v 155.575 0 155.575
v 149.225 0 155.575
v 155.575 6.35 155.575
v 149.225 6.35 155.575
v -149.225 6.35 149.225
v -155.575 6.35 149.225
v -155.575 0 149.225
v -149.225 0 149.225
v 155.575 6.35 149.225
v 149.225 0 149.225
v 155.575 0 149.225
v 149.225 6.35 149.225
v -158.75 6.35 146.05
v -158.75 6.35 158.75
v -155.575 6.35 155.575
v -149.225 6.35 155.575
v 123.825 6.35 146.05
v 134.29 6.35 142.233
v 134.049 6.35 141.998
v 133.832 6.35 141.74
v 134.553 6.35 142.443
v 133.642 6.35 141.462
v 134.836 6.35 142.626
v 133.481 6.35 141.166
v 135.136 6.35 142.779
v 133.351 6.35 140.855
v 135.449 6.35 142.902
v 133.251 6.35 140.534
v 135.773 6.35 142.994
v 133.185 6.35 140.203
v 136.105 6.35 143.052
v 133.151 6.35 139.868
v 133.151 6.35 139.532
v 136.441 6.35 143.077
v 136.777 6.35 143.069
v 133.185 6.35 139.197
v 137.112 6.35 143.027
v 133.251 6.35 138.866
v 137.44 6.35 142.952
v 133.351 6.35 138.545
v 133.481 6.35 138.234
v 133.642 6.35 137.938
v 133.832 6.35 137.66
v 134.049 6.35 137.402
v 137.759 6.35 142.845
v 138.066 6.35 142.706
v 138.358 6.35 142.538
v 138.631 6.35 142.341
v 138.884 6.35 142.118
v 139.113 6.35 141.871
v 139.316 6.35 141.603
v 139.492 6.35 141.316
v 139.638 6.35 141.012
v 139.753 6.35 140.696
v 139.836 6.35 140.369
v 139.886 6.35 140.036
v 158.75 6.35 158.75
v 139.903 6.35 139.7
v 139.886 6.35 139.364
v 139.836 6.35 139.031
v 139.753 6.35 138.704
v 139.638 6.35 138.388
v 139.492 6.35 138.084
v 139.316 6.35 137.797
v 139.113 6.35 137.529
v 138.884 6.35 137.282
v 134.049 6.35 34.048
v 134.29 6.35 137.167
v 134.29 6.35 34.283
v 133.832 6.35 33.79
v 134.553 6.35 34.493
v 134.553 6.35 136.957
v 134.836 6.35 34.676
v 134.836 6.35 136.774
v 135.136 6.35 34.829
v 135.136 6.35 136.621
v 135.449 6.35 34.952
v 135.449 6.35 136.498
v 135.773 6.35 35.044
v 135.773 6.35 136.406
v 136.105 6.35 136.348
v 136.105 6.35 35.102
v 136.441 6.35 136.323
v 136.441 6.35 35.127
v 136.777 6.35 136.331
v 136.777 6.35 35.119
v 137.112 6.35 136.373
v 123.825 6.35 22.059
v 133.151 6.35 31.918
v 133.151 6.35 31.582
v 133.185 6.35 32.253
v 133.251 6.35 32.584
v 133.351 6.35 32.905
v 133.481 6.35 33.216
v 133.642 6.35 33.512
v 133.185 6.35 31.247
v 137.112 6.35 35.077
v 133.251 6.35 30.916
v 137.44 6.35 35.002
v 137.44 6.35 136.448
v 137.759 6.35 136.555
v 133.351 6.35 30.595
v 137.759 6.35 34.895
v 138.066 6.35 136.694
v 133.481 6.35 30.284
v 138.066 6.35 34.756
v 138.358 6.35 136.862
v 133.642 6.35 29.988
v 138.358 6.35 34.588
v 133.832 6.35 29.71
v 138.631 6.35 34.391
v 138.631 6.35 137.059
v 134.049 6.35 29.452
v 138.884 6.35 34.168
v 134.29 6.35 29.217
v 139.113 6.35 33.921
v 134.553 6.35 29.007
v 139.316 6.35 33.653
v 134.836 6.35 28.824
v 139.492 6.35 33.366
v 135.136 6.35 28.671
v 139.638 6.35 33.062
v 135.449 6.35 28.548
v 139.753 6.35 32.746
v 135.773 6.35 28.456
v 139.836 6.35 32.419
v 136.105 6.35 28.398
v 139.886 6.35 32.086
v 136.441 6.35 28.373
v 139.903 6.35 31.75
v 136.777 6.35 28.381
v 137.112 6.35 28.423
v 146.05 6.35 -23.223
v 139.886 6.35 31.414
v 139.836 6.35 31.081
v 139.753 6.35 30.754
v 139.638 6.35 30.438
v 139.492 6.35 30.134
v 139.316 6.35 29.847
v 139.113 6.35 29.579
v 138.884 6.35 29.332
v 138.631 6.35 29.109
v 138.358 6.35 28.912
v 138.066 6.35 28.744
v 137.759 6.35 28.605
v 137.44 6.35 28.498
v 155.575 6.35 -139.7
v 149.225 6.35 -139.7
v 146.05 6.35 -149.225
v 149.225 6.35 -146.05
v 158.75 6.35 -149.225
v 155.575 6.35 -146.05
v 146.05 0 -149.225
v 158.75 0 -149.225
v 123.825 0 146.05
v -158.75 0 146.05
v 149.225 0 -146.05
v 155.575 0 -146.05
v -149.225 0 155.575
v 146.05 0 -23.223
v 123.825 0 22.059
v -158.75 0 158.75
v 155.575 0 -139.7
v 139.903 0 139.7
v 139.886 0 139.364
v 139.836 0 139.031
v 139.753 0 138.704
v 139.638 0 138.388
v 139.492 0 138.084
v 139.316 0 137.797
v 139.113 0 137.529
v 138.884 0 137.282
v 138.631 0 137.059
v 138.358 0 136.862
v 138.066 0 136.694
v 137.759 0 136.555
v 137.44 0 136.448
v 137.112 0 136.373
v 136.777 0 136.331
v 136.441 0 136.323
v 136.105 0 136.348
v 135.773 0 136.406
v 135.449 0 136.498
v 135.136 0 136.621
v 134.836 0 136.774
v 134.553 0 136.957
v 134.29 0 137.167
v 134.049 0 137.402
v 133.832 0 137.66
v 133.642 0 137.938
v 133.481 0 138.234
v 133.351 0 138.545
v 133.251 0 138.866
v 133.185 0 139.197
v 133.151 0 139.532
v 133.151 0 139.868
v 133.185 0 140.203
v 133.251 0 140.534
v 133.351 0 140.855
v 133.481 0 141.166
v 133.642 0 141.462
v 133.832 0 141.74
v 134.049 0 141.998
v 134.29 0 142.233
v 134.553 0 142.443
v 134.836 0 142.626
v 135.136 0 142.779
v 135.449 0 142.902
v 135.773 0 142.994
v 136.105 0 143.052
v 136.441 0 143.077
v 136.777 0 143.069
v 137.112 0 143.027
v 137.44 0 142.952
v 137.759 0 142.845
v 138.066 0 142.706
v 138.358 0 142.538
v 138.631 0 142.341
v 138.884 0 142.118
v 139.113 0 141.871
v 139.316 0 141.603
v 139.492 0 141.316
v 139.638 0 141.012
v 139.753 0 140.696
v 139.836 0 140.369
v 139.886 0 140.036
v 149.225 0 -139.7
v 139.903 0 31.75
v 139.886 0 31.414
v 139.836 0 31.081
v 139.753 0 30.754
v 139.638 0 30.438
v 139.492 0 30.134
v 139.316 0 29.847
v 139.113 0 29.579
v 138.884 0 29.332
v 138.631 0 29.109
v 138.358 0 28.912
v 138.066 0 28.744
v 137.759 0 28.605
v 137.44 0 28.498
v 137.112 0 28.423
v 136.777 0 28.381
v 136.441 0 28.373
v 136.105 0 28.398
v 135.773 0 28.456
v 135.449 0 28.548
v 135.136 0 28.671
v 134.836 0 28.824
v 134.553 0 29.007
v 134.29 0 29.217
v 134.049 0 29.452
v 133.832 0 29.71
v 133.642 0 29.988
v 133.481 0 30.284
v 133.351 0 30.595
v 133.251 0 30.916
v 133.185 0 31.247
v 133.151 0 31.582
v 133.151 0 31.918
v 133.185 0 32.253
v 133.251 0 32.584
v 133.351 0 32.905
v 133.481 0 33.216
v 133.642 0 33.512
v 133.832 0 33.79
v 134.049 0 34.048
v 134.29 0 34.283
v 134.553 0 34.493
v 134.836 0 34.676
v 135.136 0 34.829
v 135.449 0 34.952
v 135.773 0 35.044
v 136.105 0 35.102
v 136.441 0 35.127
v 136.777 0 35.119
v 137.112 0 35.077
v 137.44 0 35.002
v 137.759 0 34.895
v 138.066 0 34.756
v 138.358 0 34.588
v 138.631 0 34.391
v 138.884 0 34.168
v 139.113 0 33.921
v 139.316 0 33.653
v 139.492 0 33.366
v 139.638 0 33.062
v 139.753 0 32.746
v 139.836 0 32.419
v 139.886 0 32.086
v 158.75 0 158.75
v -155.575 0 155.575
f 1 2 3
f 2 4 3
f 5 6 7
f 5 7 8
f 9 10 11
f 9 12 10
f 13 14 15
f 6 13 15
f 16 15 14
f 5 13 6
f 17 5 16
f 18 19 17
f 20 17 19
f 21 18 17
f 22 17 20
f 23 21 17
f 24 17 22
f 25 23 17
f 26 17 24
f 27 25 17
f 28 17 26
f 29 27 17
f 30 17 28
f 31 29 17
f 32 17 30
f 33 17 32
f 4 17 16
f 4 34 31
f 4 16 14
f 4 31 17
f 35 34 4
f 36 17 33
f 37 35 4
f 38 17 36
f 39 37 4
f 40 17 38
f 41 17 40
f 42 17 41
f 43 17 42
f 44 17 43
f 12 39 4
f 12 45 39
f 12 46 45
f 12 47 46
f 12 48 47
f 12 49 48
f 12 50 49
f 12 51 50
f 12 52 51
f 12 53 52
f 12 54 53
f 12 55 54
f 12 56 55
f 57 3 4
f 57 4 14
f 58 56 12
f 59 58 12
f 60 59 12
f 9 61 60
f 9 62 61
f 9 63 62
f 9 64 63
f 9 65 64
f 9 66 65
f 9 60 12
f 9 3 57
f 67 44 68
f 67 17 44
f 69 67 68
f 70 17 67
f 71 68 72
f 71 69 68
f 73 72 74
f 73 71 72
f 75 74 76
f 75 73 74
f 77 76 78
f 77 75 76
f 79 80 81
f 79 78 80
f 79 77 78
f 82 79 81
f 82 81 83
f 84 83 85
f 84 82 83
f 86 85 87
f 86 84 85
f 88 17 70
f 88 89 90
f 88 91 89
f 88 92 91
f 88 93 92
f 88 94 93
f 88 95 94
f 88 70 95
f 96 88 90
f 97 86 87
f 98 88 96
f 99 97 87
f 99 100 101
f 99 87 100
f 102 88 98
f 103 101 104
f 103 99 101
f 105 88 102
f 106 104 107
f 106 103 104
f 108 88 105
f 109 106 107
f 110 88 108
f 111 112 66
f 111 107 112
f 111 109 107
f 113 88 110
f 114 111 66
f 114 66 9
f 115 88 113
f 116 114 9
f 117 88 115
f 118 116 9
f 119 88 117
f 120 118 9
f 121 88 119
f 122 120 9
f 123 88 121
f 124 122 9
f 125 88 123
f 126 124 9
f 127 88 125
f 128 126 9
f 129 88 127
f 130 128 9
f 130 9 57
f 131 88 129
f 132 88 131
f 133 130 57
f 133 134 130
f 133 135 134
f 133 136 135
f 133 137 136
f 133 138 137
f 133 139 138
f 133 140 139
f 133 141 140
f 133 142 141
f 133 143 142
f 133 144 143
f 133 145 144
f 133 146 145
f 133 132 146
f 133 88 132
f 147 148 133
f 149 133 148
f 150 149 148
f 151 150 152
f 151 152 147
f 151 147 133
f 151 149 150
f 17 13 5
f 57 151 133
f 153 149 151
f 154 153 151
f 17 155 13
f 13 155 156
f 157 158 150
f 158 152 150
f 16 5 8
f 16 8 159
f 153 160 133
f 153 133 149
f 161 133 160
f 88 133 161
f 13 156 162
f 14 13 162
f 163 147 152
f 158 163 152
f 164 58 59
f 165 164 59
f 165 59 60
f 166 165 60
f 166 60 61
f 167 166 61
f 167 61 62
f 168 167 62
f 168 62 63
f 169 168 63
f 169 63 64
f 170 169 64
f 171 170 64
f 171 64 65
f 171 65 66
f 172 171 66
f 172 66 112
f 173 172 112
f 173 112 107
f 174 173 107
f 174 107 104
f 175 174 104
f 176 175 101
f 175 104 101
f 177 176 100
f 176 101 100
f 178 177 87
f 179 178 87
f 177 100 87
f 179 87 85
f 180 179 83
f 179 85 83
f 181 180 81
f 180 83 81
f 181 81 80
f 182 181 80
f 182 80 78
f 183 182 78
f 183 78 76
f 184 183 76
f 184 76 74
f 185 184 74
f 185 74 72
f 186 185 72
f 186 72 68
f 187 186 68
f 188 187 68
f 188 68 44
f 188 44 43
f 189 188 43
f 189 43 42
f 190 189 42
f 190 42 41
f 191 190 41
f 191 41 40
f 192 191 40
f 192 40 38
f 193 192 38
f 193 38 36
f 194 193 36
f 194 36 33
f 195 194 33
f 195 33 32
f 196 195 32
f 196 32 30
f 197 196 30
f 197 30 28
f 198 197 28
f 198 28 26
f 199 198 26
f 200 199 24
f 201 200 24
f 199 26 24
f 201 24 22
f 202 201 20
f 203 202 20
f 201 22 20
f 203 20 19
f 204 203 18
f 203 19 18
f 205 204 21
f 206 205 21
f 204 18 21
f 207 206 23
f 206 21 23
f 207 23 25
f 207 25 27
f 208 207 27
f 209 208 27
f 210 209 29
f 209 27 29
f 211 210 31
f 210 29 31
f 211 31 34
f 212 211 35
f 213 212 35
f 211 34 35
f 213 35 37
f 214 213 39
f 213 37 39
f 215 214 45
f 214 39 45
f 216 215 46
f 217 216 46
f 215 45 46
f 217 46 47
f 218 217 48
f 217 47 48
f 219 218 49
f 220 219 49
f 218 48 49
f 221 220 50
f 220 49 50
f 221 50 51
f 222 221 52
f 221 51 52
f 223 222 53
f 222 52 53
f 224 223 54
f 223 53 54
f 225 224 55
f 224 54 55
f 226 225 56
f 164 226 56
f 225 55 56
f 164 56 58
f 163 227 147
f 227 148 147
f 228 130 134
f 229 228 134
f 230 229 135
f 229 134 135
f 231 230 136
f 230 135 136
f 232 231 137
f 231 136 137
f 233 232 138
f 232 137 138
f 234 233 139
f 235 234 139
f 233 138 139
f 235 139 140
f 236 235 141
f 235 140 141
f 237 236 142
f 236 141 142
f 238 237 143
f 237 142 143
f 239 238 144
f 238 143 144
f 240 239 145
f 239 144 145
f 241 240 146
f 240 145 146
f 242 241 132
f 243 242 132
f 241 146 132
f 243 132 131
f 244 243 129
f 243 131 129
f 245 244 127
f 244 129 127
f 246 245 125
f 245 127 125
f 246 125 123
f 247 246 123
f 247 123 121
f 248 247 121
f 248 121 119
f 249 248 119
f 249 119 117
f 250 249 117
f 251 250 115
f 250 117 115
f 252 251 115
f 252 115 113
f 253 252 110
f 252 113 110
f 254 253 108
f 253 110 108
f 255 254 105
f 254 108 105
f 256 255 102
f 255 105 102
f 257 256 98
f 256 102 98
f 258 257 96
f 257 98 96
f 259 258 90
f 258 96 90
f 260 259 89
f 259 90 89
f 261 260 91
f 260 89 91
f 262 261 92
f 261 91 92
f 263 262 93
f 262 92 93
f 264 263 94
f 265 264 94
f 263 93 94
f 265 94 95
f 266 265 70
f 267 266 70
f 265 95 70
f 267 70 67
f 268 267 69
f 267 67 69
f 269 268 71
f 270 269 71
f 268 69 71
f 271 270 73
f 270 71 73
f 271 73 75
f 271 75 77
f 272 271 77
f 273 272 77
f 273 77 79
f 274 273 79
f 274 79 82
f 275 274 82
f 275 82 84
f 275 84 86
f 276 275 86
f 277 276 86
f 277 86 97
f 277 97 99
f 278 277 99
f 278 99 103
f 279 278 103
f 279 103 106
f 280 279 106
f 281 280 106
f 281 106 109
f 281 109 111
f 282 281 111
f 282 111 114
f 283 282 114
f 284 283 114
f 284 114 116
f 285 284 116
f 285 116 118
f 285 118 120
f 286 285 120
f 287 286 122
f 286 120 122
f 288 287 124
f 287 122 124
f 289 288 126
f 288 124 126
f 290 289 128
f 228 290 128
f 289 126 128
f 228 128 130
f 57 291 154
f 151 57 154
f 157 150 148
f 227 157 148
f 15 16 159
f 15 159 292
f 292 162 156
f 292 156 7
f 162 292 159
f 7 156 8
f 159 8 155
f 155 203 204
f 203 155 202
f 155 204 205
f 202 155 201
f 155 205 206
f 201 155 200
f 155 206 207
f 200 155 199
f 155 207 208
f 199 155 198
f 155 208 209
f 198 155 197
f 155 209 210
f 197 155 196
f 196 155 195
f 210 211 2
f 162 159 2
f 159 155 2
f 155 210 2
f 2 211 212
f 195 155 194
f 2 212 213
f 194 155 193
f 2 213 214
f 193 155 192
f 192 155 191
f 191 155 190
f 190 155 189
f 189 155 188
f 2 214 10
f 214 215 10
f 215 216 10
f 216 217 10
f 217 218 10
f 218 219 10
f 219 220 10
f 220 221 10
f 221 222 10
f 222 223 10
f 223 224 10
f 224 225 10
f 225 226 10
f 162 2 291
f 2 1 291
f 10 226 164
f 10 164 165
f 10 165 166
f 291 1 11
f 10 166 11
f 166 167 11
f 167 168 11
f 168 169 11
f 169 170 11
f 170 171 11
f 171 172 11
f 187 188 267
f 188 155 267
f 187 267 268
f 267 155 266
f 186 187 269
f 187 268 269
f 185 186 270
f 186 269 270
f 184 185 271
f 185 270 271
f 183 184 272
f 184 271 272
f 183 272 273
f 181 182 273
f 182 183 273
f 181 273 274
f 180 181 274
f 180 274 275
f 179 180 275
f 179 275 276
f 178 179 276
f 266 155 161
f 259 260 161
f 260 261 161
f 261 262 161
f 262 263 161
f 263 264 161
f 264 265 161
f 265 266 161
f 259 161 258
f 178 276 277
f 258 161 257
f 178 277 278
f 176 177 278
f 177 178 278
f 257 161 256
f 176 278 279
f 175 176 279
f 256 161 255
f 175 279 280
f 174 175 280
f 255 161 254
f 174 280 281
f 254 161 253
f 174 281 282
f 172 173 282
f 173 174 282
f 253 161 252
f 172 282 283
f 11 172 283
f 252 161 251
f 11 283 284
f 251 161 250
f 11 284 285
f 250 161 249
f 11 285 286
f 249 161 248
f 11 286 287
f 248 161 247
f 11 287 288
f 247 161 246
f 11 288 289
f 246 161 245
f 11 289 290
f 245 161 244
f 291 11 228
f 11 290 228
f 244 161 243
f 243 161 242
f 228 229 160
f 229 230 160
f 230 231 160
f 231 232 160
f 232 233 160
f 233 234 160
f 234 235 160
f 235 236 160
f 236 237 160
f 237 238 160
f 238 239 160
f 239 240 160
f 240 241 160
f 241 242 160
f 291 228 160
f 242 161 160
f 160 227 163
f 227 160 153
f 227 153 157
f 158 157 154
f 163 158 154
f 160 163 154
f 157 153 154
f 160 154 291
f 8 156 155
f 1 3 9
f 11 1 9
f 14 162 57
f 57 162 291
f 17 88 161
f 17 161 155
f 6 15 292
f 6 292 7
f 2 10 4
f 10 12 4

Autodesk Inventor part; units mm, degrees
ref_plane "YZ Plane" through (0, 0, 0) normal (1, 0, 0) x (0, 1, 0)
ref_plane "XZ Plane" through (0, 0, 0) normal (0, 1, 0) x (-1, 0, 0)
ref_plane "XY Plane" through (0, 0, 0) normal (0, 0, 1) x (1, 0, 0)
sketch "Sketch1" plane through (0, 0, 0) normal (0, 1, 0) x (-1, 0, 0)
  circle A0 centre (0, 0) radius 139.7
  line L0 (-146.05, 146.05) -> (-146.05, -146.05)
  line L1 (-146.05, -146.05) -> (0, -146.05)
  line L2 (-158.75, 158.75) -> (-158.75, -158.75)
  line L3 (-158.75, -158.75) -> (0, -158.75)
  line L4 (0, -158.75) -> (0, -146.05)
  line L5 (-146.05, 146.05) -> (146.05, 146.05)
  line L6 (146.05, 146.05) -> (146.05, 146.05)
  line L7 (146.05, 146.05) -> (158.75, 146.05)
  line L8 (158.75, 146.05) -> (158.75, 158.75)
  line L9 (158.75, 158.75) -> (-158.75, 158.75)
  dimension "d0" = 279.4
  dimension "d2" = 146.05
  dimension "d4" = 146.05
  dimension "d6" = 0
  dimension "d9" = 317.5
  dimension "d30" = 12.7
  dimension "d31" = 292.1
  dimension "d32" = 0
  dimension "d33" = 12.7
  dimension "d34" = 12.7
extrude "Extrusion1" add sketch "Sketch1" along normal blind 6.35 contours L0 L1 L4 L3 L2 L9 L8 L7 L5
sketch "Sketch2" plane through (0, 6.35, 0) normal (0, 1, 0) x (1, 0, 0)
  line L0 (-50.8, -158.75) -> (158.75, -158.75) projected
  line L1 (158.75, -158.75) -> (158.75, 158.75) projected
  line L2 (158.75, 158.75) -> (0, 158.75) projected
  line L3 (146.05, 146.05) -> (146.05, -146.05) projected
  line L4 (149.225, -149.225) -> (149.225, -155.575)
  line L5 (149.225, -155.575) -> (155.575, -155.575)
  line L6 (155.575, -155.575) -> (155.575, -149.225)
  line L7 (149.225, -149.225) -> (155.575, -149.225)
  line L8 (155.575, 146.05) -> (149.225, 146.05)
  line L9 (149.225, 146.05) -> (149.225, 139.7)
  line L10 (149.225, 139.7) -> (155.575, 139.7)
  line L11 (155.575, 139.7) -> (155.575, 146.05)
  point P0 (0, 0)
  dimension "d12" = 6.35
  dimension "d13" = 6.35
  dimension "d14" = 6.35
  dimension "d15" = 3.175
  dimension "d16" = 3.175
  dimension "d20" = 12.7
  dimension "d22" = 3.175
  dimension "d23" = 6.35
  dimension "d24" = 6.35
extrude "Extrusion2" cut sketch "Sketch2" against normal blind 6.35
sketch "Sketch3" plane through (0, 6.35, 0) normal (0, 1, 0) x (1, 0, 0)
  line L0 (158.75, -158.75) -> (158.75, 158.75) projected
  line L1 (158.75, 158.75) -> (0, 158.75) projected
  line L2 (0, 158.75) -> (0, 146.05) projected
  line L3 (0, 146.05) -> (146.05, 146.05) projected
  line L4 (146.05, 146.05) -> (146.05, -146.05) projected
  line L5 (146.05, 146.05) -> (146.05, 149.225)
  line L6 (146.05, 149.225) -> (158.75, 149.225)
  point P0 (0, 0)
  dimension "d27" = 3.175
extrude "Extrusion3" cut sketch "Sketch3" against normal blind 25.4
sketch "Sketch4" plane through (0, 6.35, 0) normal (0, 1, 0) x (1, 0, 0)
  line L0 (-146.05, -146.05) -> (-146.05, 50.8) projected
  line L1 (146.05, -146.05) -> (-158.75, -146.05) projected
  line L2 (-158.75, -146.05) -> (-158.75, -158.75) projected
  line L3 (-158.75, -158.75) -> (158.75, -158.75) projected
  line L4 (-155.575, -149.225) -> (-149.225, -149.225)
  line L5 (-149.225, -149.225) -> (-149.225, -155.575)
  line L6 (-149.225, -155.575) -> (-155.575, -155.575)
  line L7 (-155.575, -155.575) -> (-155.575, -149.225)
  line L8 (-155.575, -149.225) -> (-149.225, -149.225)
  line L9 (-149.225, -149.225) -> (-149.225, -155.575)
  line L10 (-149.225, -155.575) -> (-155.575, -155.575)
  line L11 (-155.575, -155.575) -> (-155.575, -149.225)
  point P0 (0, 0)
  dimension "d35" = 6.35
  dimension "d36" = 6.35
  dimension "d37" = 3.175
  dimension "d38" = 3.175
  dimension "d39" = 6.35
  dimension "d40" = 6.35
  dimension "d41" = 3.175
  dimension "d42" = 3.175
extrude "Extrusion4" cut sketch "Sketch4" against normal blind 25.4
sketch "Sketch5" plane through (0, 6.35, 0) normal (0, 1, 0) x (1, 0, 0)
  line L0 (146.05, 149.225) -> (146.05, -146.05) projected
  line L1 (146.05, -146.05) -> (-158.75, -146.05) projected
  line L2 (15.614, 398.8063) -> (14.3339, 396.1981) projected
  line L3 (-2.3465, 398.8063) -> (15.614, 398.8063) projected
  line L4 (-15.5314, 408.5363) -> (-2.3465, 398.8063) projected
  line L5 (-126.7438, 181.9462) -> (-15.5314, 408.5363) projected
  line L6 (-126.5217, 145.8051) -> (-126.7438, 181.9462) projected
  line L7 (-172.6074, 51.9077) -> (-126.5217, 145.8051) projected
  line L8 (-220.5546, 34.8604) -> (-192.6079, 6.9152) projected
  line L9 (-192.6079, 6.9152) -> (-161.0476, 38.8664) projected
  line L10 (-106.2691, 150.4752) -> (-161.0476, 38.8664) projected
  line L11 (-106.2691, 150.4752) -> (-104.024, 150.4752) projected
  line L12 (-104.024, 150.4752) -> (-98.9034, 160.9082) projected
  line L13 (-98.9034, 160.9082) -> (-101.1485, 160.9082) projected
  line L14 (9.2132, 385.765) -> (-101.1485, 160.9082) projected
  line L15 (11.4583, 385.765) -> (9.2132, 385.765) projected
  line L16 (16.5789, 396.1981) -> (11.4583, 385.765) projected
  line L17 (14.3339, 396.1981) -> (16.5789, 396.1981) projected
  line L18 (146.05, 23.2231) -> (123.825, -22.0593)
  line L19 (123.825, -22.0593) -> (123.825, -146.05)
  line L20 (-172.6074, 51.9077) -> (-188.2578, 67.5573) projected
  line L21 (-188.2578, 67.5573) -> (-220.5546, 34.8604) projected
  point P0 (0, 0)
  dimension "d47" = 22.225
  dimension "d48" = 282.575
extrude "Extrusion5" add sketch "Sketch5" against normal blind 6.35 contours L0 L1 L19 L18
sketch "Sketch6" plane through (0, 6.35, 0) normal (0, 1, 0) x (1, 0, 0)
  line L0 (123.825, -22.0593) -> (123.825, -146.05) projected
  line L1 (123.825, -146.05) -> (-158.75, -146.05) projected
  circle A0 centre (136.525, -139.7) radius 3.3782
  circle A1 centre (136.525, -31.75) radius 3.3782
  point P0 (0, 0)
  dimension "d51" = 6.7564
  dimension "d52" = 6.7564
  dimension "d55" = 6.35
  dimension "d56" = 12.7
  dimension "d59" = 12.7
  dimension "d60" = 107.95
extrude "Extrusion6" cut sketch "Sketch6" against normal blind 6.35
properties part number "Bottom Plate" material "Polycarbonate, Clear"
